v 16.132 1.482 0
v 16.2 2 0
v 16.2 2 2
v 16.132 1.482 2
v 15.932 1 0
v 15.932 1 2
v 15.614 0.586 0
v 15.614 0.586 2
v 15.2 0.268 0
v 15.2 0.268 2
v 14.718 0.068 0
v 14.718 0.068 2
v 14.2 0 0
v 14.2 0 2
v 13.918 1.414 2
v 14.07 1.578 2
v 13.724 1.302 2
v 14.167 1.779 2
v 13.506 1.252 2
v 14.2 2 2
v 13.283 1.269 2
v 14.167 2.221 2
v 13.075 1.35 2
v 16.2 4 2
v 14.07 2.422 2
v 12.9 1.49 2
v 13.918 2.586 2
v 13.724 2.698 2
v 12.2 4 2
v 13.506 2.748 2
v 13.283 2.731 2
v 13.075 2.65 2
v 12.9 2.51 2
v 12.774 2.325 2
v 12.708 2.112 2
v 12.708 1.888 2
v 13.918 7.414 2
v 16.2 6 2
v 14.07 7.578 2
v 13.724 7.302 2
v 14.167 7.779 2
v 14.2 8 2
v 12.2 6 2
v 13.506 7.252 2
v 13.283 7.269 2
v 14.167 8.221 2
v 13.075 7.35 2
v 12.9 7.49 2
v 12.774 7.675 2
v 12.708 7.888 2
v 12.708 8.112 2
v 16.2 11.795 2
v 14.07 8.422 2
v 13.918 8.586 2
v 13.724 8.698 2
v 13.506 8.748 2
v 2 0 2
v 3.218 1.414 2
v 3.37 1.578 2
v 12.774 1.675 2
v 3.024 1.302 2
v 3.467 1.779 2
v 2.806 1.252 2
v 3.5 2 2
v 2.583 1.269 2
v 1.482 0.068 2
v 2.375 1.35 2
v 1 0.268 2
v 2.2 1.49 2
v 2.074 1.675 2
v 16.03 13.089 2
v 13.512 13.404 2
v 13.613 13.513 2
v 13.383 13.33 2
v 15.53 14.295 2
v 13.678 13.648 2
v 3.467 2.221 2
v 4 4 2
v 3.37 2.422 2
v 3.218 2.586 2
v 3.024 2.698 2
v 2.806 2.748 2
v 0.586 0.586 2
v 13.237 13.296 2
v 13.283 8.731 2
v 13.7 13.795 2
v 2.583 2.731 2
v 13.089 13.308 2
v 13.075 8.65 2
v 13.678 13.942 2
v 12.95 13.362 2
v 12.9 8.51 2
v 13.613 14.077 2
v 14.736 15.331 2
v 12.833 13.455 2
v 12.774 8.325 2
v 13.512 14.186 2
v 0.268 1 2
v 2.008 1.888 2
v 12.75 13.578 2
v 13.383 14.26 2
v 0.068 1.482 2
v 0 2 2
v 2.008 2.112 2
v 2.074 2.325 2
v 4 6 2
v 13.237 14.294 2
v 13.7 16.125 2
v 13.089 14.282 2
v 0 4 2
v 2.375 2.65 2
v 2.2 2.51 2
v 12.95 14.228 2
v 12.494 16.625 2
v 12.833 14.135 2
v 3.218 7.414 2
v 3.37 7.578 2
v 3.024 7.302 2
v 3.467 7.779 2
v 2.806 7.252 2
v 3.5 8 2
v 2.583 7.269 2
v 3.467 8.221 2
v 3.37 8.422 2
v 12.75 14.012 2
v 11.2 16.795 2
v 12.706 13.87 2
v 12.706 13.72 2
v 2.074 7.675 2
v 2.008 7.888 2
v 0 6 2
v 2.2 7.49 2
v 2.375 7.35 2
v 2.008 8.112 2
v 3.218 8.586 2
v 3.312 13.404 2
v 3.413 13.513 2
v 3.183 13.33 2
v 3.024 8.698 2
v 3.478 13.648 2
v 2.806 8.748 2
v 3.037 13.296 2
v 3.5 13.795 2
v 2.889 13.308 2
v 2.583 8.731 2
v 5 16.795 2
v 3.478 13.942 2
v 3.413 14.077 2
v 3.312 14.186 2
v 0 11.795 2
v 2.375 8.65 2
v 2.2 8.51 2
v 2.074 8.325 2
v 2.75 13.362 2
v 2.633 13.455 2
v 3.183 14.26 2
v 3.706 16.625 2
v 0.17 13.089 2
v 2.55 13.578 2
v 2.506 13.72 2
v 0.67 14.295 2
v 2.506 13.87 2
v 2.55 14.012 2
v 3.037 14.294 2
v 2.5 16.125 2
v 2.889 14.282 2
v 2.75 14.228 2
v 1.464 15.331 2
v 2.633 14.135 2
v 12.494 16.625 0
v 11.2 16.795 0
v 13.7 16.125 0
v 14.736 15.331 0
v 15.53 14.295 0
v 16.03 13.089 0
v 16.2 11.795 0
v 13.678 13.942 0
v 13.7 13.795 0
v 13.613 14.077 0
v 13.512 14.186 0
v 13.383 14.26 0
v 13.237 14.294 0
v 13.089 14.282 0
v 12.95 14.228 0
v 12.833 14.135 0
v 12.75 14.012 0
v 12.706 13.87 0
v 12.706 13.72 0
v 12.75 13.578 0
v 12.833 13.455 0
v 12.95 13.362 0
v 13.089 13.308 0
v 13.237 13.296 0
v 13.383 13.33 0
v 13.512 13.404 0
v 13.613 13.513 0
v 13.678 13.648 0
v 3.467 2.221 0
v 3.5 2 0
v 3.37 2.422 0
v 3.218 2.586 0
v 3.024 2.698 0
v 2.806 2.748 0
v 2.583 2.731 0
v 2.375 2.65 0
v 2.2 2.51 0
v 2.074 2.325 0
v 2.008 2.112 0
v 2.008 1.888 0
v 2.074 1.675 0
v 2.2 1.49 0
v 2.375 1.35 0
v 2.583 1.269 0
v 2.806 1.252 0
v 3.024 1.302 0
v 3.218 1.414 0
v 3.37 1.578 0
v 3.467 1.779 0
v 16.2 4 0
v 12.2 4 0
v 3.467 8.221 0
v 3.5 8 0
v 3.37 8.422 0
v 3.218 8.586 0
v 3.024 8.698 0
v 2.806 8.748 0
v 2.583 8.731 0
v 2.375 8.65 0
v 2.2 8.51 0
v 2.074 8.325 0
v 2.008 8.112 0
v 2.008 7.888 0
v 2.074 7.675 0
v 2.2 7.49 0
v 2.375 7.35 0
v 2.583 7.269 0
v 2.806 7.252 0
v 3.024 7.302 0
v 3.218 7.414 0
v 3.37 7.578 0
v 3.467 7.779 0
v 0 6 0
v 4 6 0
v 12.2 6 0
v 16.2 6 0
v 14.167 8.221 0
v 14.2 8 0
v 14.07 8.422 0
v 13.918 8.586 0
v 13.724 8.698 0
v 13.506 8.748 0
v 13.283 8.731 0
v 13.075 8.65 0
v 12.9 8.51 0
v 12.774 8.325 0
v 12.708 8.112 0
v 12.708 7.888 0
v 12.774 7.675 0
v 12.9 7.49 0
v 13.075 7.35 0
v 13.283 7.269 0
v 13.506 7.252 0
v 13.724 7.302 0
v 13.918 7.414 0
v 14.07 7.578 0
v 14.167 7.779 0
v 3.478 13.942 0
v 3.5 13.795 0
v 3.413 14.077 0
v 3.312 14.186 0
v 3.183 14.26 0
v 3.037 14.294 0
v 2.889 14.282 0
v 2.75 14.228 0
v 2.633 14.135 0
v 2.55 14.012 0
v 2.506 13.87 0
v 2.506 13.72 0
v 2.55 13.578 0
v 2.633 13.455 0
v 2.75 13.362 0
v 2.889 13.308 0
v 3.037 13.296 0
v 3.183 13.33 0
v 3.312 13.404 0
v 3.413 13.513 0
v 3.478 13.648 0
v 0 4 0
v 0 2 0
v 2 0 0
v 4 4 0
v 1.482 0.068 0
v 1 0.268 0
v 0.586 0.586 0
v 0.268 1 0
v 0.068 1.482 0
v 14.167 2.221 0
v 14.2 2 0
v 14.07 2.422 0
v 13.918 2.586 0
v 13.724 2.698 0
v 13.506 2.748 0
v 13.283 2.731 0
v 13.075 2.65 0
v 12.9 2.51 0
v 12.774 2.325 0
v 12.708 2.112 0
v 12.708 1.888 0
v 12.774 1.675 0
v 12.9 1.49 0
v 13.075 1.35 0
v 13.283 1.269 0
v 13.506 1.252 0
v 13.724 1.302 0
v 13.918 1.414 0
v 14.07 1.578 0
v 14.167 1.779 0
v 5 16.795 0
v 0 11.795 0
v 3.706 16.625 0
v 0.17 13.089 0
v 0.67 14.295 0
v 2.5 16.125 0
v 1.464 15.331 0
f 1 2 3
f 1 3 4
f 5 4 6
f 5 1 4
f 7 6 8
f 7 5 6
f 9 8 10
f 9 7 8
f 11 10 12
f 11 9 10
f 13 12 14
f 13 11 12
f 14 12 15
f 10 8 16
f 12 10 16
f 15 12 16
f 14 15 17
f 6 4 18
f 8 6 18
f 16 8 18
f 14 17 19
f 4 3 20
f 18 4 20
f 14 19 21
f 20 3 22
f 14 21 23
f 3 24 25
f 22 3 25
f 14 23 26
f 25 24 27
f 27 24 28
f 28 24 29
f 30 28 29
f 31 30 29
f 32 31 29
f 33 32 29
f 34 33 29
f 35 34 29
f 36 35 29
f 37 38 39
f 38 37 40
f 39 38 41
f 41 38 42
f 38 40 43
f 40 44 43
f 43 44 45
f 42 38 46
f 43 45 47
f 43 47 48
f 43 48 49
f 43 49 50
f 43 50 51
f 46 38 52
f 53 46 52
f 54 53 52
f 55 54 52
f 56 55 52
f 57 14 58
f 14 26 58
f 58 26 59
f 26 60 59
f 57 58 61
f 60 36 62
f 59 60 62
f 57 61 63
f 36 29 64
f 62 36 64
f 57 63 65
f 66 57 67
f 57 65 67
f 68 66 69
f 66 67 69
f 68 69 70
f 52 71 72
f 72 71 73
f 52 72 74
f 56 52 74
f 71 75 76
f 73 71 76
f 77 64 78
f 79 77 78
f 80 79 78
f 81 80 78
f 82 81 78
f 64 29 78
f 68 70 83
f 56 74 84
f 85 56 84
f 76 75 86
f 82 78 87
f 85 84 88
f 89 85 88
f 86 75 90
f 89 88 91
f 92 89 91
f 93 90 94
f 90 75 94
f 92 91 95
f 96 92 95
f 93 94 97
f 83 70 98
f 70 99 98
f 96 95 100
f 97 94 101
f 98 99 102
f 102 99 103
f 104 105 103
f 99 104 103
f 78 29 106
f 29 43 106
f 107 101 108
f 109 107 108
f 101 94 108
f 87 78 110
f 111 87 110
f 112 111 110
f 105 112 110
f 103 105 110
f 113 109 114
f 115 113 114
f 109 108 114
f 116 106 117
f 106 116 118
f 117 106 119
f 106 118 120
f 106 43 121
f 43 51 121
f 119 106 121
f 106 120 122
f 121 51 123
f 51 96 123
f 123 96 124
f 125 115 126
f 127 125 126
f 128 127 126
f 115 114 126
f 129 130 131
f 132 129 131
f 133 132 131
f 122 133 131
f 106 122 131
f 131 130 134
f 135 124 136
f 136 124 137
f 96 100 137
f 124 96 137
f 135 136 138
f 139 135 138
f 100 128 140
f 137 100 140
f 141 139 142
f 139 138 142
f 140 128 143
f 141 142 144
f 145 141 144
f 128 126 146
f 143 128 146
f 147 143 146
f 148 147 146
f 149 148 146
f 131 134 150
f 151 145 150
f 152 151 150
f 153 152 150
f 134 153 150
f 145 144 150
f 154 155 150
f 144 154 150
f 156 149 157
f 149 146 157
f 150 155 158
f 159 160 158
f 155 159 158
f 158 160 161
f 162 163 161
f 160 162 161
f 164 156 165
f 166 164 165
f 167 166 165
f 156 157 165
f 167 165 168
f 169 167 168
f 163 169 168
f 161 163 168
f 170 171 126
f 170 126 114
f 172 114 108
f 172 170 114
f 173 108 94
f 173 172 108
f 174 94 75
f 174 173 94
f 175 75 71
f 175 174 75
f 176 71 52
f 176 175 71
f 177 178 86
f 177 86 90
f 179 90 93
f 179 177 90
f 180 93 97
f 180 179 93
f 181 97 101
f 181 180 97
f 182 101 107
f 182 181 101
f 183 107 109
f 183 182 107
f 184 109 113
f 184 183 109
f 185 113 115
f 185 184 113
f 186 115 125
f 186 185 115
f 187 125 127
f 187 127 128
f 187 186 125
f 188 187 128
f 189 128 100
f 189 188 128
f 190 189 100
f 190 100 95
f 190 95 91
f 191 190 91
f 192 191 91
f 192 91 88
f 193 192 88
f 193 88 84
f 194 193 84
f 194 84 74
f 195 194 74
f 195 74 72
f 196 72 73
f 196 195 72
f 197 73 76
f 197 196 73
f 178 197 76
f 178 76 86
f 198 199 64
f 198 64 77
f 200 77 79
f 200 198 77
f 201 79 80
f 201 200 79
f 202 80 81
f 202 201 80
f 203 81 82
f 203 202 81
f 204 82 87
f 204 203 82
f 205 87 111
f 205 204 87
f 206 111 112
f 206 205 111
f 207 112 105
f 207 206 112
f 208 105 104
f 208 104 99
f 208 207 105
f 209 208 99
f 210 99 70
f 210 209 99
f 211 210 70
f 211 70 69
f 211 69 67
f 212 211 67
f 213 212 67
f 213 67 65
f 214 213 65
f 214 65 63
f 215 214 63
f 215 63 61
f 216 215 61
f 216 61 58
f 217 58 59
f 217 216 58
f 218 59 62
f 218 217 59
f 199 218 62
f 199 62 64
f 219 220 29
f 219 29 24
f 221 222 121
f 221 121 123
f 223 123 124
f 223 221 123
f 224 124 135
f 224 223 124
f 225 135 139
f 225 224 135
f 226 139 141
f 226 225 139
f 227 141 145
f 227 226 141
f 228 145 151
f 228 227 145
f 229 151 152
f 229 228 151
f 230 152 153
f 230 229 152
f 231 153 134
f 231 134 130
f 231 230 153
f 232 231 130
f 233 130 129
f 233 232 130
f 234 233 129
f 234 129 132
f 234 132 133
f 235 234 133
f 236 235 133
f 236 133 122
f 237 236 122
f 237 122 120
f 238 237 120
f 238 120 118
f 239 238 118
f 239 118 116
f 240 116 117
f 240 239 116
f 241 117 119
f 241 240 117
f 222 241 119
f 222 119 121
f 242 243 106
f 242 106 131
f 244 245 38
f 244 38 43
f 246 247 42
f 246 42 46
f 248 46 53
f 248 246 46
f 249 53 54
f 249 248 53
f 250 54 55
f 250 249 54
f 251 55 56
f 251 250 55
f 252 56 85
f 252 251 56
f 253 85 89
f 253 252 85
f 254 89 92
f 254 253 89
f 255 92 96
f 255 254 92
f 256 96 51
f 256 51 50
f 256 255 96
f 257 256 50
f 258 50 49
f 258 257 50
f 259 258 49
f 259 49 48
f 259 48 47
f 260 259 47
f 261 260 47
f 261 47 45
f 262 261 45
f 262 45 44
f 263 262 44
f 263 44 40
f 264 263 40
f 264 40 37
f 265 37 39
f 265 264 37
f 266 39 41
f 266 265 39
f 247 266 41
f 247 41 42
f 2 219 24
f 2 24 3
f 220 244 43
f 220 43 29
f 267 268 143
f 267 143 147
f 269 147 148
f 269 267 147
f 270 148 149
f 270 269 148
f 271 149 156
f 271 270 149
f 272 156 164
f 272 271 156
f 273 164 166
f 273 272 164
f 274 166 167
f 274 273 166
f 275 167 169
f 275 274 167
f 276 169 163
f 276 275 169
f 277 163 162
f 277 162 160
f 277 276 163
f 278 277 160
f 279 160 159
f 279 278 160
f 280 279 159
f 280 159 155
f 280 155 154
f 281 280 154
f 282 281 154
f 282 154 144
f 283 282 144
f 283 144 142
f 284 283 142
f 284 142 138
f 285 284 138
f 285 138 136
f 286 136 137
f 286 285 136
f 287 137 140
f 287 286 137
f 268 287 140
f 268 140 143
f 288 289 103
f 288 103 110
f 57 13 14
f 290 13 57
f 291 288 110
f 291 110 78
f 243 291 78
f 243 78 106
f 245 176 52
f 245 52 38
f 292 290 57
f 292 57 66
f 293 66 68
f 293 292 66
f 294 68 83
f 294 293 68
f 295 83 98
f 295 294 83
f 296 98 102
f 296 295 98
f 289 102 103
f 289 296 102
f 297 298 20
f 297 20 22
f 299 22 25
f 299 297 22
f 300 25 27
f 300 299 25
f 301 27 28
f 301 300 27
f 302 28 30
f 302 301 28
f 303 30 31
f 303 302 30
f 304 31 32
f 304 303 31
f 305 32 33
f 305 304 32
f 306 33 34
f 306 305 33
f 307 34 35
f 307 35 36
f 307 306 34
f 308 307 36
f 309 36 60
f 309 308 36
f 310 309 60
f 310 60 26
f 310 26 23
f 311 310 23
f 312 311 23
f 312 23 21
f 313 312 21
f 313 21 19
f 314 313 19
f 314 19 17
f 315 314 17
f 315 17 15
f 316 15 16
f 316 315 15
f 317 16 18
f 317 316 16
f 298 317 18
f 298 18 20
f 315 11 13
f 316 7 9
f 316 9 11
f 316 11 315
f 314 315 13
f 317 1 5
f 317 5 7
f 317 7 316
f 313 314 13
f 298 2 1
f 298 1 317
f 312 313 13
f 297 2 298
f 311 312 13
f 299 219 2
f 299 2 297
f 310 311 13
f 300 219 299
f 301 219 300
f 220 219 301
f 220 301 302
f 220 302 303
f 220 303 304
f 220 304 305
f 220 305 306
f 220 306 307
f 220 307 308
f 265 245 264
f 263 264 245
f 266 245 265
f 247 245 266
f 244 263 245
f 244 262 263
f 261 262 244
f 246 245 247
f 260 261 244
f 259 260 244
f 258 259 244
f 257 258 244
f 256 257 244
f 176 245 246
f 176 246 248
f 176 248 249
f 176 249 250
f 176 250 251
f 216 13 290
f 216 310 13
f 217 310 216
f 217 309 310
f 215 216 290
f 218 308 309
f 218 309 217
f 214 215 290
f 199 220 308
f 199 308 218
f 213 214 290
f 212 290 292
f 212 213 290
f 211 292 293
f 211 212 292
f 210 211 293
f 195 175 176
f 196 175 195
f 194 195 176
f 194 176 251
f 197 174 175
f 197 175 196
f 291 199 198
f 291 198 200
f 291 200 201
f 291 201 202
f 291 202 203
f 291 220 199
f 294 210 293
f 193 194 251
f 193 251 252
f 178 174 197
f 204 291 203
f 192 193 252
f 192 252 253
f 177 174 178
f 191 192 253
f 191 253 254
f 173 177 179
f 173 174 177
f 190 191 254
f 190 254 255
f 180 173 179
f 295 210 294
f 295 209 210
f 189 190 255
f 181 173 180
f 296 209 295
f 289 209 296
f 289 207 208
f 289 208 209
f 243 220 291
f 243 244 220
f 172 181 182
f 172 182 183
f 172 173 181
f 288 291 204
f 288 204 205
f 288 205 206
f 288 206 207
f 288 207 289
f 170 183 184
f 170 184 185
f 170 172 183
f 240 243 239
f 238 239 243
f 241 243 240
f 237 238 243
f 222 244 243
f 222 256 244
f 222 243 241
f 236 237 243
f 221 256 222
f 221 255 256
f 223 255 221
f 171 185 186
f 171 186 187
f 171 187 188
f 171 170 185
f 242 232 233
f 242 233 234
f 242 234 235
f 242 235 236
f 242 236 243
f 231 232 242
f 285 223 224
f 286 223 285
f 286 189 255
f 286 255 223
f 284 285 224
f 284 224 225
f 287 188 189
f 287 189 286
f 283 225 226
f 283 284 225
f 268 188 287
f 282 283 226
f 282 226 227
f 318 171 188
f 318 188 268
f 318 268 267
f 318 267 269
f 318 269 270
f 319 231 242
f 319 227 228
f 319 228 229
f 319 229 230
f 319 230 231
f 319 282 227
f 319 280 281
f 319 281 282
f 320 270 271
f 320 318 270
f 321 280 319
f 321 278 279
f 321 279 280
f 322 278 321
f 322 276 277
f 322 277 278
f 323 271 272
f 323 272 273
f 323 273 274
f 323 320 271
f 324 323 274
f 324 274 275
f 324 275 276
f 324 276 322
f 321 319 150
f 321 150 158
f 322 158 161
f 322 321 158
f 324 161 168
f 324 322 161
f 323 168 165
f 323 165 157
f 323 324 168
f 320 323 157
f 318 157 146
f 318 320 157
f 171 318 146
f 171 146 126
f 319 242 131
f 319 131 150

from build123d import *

# Parameters (mm, degrees)
SKETCH1_R           = 0.75
SKETCH1_R_2         = 0.5
BOSS_EXTRUDE1_DEPTH = 2


with BuildPart() as part:
    # Sketch1 → Boss-Extrude1 (new body)
    with BuildSketch(Plane.XY):
        with BuildLine():
            Line((0, 6), (0, 11.795))
            ThreePointArc((0, 11.795), (1.464466094, 15.330533906), (5, 16.795))
            Line((5, 16.795), (11.2, 16.795))
            ThreePointArc((11.2, 16.795), (14.735533906, 15.330533906), (16.2, 11.795))
            Line((16.2, 11.795), (16.2, 6))
            Line((16.2, 6), (12.2, 6))
            Line((12.2, 6), (12.2, 4))
            Line((12.2, 4), (16.2, 4))
            Line((16.2, 4), (16.2, 2))
            ThreePointArc((16.2, 2), (15.614213562, 0.585786438), (14.2, 0))
            Line((14.2, 0), (2, 0))
            ThreePointArc((2, 0), (0.585786438, 0.585786438), (0, 2))
            Line((0, 2), (0, 4))
            Line((0, 4), (4, 4))
            Line((4, 4), (4, 6))
            Line((4, 6), (0, 6))
        make_face()
        with Locations((13.45, 2)):
            Circle(SKETCH1_R, mode=Mode.SUBTRACT)
        with Locations((13.45, 8)):
            Circle(SKETCH1_R, mode=Mode.SUBTRACT)
        with Locations((3, 13.795)):
            Circle(SKETCH1_R_2, mode=Mode.SUBTRACT)
        with Locations((13.2, 13.795)):
            Circle(SKETCH1_R_2, mode=Mode.SUBTRACT)
        with Locations((2.75, 8)):
            Circle(SKETCH1_R, mode=Mode.SUBTRACT)
        with Locations((2.75, 2)):
            Circle(SKETCH1_R, mode=Mode.SUBTRACT)
    extrude(amount=BOSS_EXTRUDE1_DEPTH)


solid = part.part
